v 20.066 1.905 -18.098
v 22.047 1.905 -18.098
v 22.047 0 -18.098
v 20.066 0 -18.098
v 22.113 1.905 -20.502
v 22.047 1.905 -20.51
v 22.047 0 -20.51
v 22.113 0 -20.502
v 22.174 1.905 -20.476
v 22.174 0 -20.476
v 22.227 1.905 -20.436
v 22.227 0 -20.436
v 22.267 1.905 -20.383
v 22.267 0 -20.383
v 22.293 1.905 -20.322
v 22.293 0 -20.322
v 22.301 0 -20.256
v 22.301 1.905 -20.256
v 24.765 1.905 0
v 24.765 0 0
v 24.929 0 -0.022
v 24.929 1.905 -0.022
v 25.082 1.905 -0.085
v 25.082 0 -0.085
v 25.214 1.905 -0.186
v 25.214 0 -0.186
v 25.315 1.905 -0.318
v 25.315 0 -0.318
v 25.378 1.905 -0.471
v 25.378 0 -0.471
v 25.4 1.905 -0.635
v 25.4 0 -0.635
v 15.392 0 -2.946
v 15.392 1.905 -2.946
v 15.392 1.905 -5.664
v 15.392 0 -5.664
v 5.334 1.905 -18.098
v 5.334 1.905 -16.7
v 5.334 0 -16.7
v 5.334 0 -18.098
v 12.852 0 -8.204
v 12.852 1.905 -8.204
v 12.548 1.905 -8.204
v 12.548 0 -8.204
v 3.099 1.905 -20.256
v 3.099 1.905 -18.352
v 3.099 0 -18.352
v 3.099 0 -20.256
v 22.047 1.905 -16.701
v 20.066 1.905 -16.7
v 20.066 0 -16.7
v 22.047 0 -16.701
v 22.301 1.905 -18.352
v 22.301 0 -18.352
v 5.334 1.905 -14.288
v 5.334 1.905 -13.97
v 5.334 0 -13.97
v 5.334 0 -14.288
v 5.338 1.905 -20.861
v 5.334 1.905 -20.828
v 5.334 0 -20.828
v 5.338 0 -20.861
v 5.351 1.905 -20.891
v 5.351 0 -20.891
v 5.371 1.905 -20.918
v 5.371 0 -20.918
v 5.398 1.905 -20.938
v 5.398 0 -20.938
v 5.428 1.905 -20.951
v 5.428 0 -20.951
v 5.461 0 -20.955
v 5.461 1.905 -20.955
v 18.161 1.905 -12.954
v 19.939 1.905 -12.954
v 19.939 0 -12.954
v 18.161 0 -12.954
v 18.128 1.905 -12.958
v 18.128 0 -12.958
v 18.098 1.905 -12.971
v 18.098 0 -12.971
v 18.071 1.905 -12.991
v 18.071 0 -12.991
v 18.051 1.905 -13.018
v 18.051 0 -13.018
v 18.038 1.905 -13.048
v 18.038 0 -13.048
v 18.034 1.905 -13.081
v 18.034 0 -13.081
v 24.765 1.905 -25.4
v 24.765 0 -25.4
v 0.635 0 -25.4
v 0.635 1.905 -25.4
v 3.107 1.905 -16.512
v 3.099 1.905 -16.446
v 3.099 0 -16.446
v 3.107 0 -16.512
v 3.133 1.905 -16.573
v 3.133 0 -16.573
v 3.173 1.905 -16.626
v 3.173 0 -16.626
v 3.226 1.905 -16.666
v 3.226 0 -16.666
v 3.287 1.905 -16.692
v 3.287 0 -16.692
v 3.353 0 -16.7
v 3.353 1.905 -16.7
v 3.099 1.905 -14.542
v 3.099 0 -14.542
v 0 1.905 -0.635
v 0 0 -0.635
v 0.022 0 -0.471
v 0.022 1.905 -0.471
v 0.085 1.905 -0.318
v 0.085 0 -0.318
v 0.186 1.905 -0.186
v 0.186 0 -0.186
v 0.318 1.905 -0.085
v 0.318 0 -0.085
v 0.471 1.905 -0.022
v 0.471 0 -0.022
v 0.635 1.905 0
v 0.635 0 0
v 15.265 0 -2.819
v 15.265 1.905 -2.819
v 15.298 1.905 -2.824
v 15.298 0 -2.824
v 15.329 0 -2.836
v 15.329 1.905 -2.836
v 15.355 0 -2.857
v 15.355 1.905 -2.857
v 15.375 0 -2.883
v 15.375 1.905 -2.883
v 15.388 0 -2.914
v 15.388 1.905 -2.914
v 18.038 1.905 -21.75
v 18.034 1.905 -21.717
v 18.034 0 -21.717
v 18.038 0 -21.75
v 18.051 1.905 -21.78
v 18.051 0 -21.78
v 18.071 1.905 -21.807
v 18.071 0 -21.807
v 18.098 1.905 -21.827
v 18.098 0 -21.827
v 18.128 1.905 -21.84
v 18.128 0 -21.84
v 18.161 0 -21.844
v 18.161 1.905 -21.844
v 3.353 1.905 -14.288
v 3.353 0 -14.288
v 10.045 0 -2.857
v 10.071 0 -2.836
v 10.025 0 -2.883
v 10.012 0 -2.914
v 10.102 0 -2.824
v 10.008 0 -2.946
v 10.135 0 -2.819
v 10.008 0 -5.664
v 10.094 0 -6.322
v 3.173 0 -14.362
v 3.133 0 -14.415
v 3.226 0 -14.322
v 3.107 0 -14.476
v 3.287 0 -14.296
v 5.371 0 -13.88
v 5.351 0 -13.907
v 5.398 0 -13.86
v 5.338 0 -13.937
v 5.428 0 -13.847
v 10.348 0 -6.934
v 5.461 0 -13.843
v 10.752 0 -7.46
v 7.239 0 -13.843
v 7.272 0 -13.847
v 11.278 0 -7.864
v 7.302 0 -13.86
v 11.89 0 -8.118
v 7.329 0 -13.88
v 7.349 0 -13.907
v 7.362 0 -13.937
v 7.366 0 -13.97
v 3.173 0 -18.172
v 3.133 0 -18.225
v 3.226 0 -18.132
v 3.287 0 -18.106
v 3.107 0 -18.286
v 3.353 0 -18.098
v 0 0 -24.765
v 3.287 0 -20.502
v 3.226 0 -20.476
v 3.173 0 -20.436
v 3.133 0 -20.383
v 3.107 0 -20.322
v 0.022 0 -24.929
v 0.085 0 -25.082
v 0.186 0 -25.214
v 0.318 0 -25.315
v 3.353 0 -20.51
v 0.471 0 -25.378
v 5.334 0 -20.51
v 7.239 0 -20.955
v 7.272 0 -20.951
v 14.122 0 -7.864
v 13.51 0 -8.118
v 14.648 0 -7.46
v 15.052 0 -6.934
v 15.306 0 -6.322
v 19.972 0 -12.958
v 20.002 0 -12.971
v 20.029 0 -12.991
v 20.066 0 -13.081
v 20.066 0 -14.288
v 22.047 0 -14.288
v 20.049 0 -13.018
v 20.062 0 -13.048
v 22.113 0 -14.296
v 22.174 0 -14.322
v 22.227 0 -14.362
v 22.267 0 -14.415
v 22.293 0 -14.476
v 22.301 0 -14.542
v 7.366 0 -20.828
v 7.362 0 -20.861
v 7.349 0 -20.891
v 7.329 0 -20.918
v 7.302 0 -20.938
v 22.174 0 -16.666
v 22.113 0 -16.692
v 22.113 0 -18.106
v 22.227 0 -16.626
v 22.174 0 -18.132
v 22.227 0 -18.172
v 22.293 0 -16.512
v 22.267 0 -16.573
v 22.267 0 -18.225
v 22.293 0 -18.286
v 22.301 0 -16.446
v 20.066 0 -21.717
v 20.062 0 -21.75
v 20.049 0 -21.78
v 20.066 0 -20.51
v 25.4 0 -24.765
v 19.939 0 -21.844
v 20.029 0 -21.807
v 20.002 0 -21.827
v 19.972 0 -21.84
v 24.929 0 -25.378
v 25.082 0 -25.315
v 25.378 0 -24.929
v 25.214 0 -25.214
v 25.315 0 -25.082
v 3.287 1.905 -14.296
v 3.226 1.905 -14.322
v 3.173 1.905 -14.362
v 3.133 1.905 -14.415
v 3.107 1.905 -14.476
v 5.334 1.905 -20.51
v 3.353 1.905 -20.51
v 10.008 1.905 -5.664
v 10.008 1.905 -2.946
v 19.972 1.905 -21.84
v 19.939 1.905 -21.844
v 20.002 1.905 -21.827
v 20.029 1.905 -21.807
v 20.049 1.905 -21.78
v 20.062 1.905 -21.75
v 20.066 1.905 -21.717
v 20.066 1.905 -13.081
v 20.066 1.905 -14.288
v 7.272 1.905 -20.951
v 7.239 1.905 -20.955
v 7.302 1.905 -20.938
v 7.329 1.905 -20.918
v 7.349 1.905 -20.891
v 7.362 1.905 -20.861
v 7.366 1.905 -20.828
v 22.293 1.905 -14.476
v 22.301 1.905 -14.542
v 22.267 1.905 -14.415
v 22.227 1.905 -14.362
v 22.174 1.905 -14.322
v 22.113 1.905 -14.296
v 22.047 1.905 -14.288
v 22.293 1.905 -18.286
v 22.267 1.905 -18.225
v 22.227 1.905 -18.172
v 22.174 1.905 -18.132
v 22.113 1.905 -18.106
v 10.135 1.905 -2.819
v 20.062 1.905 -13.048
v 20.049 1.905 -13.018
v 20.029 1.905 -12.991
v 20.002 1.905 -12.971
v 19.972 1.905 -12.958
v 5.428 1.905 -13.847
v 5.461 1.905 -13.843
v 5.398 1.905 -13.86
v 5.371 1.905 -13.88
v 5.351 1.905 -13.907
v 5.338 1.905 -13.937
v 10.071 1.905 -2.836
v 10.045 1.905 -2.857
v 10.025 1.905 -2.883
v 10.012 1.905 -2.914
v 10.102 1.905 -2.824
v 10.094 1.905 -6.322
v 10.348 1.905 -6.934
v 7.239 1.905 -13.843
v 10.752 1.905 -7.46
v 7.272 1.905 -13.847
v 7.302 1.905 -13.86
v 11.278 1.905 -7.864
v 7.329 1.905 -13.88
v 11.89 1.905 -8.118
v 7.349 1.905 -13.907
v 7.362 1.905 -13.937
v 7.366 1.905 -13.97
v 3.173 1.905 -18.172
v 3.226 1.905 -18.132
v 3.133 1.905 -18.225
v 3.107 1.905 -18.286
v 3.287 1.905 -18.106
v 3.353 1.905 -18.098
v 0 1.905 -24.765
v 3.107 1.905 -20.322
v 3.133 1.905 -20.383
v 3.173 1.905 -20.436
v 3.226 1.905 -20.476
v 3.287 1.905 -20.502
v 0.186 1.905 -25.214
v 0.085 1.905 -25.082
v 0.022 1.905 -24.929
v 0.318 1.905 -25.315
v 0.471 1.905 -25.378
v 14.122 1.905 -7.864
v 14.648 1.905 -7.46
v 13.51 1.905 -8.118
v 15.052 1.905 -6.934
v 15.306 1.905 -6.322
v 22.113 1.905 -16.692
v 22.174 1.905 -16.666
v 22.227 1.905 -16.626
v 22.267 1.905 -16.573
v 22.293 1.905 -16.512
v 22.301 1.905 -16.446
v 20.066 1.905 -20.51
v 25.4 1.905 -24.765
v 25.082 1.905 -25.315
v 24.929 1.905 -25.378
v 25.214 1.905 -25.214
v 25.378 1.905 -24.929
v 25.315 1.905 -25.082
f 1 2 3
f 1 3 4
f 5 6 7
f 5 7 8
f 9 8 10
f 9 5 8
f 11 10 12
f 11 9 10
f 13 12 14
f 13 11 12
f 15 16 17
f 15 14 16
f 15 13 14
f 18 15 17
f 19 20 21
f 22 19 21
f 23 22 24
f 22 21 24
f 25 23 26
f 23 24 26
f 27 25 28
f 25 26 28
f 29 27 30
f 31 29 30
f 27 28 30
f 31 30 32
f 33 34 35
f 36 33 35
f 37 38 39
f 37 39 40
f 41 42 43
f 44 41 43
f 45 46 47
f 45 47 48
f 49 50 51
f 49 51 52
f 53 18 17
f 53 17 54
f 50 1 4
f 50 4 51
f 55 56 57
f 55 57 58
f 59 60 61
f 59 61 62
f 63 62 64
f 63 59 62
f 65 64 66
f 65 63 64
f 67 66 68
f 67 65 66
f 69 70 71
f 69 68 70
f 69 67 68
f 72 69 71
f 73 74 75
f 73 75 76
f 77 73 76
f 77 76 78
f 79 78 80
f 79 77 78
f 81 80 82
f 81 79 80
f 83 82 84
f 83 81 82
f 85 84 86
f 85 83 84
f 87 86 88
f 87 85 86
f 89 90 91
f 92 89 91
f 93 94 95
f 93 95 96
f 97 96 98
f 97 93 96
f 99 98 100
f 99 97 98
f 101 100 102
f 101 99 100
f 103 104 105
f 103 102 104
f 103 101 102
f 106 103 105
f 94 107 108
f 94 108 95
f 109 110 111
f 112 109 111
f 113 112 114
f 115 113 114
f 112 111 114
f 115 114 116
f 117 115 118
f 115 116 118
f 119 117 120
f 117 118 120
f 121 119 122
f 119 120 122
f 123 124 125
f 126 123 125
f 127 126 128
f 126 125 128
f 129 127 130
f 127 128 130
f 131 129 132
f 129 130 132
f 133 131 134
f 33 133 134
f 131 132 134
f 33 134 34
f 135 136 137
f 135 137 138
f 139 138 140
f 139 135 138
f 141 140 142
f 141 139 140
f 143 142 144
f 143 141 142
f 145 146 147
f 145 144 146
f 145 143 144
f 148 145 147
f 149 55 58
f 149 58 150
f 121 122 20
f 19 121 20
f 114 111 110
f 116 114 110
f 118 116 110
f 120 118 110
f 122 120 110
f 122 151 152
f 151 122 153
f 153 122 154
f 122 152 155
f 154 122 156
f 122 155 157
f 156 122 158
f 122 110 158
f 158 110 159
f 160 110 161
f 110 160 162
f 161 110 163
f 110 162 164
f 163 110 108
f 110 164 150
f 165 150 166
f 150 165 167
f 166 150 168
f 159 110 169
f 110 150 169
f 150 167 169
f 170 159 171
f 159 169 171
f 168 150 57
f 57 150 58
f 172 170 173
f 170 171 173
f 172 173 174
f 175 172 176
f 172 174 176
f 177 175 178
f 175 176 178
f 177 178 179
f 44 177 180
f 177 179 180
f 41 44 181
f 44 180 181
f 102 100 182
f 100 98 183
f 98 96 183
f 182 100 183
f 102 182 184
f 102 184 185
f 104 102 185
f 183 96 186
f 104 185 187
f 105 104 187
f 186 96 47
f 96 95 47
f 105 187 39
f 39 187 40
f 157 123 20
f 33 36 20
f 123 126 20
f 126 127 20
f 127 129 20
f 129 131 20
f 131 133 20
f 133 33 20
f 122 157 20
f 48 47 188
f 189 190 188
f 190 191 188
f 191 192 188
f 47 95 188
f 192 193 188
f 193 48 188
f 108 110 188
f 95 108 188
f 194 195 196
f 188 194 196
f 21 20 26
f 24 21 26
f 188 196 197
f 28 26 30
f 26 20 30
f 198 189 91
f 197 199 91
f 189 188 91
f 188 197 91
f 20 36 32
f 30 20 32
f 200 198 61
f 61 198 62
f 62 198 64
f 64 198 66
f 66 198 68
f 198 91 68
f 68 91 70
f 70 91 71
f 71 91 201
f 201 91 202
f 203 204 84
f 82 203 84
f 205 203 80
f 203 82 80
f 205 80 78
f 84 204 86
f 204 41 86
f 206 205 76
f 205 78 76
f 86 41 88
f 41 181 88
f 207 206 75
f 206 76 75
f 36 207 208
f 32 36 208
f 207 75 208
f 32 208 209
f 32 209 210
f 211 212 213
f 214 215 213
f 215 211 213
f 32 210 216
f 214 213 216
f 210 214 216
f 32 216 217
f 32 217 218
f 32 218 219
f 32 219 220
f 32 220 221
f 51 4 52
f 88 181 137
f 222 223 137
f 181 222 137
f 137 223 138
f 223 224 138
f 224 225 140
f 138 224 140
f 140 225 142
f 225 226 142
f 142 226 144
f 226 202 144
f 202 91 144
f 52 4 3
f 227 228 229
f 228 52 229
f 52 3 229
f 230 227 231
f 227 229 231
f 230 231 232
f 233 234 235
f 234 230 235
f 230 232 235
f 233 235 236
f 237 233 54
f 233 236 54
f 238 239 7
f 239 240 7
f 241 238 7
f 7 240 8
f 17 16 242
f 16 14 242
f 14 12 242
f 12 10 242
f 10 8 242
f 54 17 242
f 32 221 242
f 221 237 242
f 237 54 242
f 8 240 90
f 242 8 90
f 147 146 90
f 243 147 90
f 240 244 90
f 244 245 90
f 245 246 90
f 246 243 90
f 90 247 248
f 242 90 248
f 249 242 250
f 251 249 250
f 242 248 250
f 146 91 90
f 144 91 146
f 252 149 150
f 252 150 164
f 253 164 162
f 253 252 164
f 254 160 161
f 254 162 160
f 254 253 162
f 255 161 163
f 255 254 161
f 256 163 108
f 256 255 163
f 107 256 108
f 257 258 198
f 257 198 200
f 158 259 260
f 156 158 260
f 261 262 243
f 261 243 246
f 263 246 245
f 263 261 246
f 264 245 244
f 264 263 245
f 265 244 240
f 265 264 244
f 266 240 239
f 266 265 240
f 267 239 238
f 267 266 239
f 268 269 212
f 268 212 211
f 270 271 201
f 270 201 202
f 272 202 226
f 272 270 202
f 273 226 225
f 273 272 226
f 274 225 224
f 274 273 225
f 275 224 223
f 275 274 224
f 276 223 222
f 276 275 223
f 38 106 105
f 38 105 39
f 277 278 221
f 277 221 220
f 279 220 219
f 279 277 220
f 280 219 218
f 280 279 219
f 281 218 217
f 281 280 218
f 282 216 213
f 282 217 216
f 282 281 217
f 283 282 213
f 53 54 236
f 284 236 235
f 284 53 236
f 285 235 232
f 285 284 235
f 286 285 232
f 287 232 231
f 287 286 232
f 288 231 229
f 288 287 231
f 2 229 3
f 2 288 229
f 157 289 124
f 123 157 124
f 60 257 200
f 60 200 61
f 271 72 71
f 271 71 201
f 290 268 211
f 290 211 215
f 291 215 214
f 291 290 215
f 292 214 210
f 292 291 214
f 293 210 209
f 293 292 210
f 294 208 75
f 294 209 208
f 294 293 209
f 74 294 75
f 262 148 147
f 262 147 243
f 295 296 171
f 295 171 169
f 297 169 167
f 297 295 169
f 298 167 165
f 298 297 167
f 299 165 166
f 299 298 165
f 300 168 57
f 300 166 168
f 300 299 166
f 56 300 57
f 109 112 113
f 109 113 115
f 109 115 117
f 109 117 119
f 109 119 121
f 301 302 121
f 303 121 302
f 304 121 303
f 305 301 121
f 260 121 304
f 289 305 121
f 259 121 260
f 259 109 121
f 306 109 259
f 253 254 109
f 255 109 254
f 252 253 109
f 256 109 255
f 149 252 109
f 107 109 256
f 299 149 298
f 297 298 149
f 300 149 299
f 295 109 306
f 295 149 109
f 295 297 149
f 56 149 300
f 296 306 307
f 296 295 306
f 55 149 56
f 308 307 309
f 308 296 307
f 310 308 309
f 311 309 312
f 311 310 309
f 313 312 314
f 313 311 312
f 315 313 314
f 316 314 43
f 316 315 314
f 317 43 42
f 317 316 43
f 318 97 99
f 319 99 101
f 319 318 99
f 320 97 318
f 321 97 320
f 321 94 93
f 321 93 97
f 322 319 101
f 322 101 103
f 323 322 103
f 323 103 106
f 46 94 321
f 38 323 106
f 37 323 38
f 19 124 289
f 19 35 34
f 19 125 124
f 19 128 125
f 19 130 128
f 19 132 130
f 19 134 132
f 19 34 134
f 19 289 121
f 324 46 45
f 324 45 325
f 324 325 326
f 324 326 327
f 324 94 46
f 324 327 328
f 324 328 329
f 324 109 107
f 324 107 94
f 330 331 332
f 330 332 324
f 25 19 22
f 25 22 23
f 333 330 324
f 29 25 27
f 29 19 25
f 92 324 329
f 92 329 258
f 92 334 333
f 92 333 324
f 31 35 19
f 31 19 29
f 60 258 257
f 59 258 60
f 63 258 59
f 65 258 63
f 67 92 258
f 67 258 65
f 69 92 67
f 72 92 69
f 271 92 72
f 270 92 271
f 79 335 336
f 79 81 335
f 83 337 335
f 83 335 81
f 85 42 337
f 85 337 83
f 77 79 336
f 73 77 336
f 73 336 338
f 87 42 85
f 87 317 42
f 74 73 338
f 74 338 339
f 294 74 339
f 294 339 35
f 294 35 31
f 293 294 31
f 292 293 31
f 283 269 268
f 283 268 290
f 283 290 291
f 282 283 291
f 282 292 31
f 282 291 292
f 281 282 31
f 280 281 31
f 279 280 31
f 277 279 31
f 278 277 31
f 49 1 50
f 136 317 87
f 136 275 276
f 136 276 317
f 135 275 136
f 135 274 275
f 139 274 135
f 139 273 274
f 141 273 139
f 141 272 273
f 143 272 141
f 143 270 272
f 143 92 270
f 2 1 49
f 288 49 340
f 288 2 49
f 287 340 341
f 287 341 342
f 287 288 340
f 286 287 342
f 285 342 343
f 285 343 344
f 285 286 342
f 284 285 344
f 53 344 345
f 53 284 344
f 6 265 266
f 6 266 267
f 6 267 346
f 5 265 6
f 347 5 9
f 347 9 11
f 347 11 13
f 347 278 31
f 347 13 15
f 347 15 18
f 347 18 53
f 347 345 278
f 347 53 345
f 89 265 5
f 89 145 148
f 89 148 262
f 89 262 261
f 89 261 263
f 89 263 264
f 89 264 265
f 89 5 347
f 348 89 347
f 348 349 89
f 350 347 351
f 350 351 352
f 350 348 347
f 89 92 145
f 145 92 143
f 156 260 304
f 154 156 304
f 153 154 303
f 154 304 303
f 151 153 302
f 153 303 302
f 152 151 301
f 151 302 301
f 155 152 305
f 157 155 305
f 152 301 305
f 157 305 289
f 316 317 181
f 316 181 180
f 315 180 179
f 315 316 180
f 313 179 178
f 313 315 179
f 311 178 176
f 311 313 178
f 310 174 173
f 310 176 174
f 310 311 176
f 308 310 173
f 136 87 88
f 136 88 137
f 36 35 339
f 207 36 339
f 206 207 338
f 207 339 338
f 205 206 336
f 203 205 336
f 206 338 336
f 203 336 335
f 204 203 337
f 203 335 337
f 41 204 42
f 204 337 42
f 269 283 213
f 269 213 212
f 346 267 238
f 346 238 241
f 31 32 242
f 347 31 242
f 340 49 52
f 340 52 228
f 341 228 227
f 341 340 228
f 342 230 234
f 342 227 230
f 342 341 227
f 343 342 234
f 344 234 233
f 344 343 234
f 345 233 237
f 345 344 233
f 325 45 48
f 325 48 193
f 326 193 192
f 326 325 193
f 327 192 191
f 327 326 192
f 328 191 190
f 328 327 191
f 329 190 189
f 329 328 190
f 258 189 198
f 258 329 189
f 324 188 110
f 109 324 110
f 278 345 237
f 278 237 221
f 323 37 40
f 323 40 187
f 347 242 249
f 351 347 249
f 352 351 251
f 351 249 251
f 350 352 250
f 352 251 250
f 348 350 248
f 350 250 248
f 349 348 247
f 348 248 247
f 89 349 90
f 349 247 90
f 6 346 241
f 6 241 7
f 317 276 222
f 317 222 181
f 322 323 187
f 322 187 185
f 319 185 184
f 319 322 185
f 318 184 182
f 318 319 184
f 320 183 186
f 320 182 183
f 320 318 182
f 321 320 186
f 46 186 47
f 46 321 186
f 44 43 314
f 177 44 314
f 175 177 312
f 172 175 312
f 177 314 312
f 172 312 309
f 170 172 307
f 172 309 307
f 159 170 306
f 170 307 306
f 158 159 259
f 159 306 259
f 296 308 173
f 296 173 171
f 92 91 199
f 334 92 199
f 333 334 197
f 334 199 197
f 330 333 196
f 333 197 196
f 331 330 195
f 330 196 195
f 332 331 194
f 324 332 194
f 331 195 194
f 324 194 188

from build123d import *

# Parameters (mm, degrees)
BOSS_EXTRUDE1_DEPTH = 1.905
CUT_EXTRUDE1_DEPTH  = 36.971502957


with BuildPart() as part:
    # Sketch1 → Boss-Extrude1 (new body)
    with BuildSketch(Plane(origin=(0, 0, 0), x_dir=(1, 0, 0), z_dir=(0, 1, 0))):
        with BuildLine():
            Line((0.635, 0), (24.765, 0))
            ThreePointArc((24.765, 0), (25.214012806, 0.185987194), (25.4, 0.635))
            Line((25.4, 0.635), (25.4, 24.765))
            ThreePointArc((25.4, 24.765), (25.214012806, 25.214012806), (24.765, 25.4))
            Line((24.765, 25.4), (0.635, 25.4))
            ThreePointArc((0.635, 25.4), (0.185987194, 25.214012806), (0, 24.765))
            Line((0, 24.765), (0, 0.635))
            ThreePointArc((0, 0.635), (0.185987194, 0.185987194), (0.635, 0))
        make_face()
    extrude(amount=BOSS_EXTRUDE1_DEPTH)

    # Sketch2 → Cut-Extrude1 (cut, through all)
    with BuildSketch(Plane(origin=(0, 1.905, 0), x_dir=(1, 0, 0), z_dir=(0, 1, 0))):
        with BuildLine():
            Line((10.1346, 2.8194), (15.2654, 2.8194))
            ThreePointArc((15.2654, 2.8194), (15.355202561, 2.856597439), (15.3924, 2.9464))
            Line((15.3924, 2.9464), (15.3924, 5.6642))
            ThreePointArc((15.3924, 5.6642), (14.648451224, 7.460251224), (12.8524, 8.2042))
            Line((12.8524, 8.2042), (12.5476, 8.2042))
            ThreePointArc((12.5476, 8.2042), (10.751548776, 7.460251224), (10.0076, 5.6642))
            Line((10.0076, 5.6642), (10.0076, 2.9464))
            ThreePointArc((10.0076, 2.9464), (10.044797439, 2.856597439), (10.1346, 2.8194))
        make_face()
        with BuildLine():
            Line((5.461, 20.955), (7.239, 20.955))
            ThreePointArc((7.239, 20.955), (7.328802561, 20.917802561), (7.366, 20.828))
            Line((7.366, 20.828), (7.366, 13.97))
            ThreePointArc((7.366, 13.97), (7.328802561, 13.880197439), (7.239, 13.843))
            Line((7.239, 13.843), (5.461, 13.843))
            ThreePointArc((5.461, 13.843), (5.371197439, 13.880197439), (5.334, 13.97))
            Line((5.334, 13.97), (5.334, 14.2875))
            Line((5.334, 14.2875), (3.3528, 14.2875))
            ThreePointArc((3.3528, 14.2875), (3.173194878, 14.361894878), (3.0988, 14.5415))
            Line((3.0988, 14.5415), (3.0988, 16.4465))
            ThreePointArc((3.0988, 16.4465), (3.173194878, 16.626105122), (3.3528, 16.7005))
            Line((3.3528, 16.7005), (5.334, 16.7005))
            Line((5.334, 16.7005), (5.334, 18.0975))
            Line((5.334, 18.0975), (3.3528, 18.0975))
            ThreePointArc((3.3528, 18.0975), (3.173194878, 18.171894878), (3.0988, 18.3515))
            Line((3.0988, 18.3515), (3.0988, 20.2565))
            ThreePointArc((3.0988, 20.2565), (3.173194878, 20.436105122), (3.3528, 20.5105))
            Line((3.3528, 20.5105), (5.334, 20.5105))
            Line((5.334, 20.5105), (5.334, 20.828))
            ThreePointArc((5.334, 20.828), (5.371197439, 20.917802561), (5.461, 20.955))
        make_face()
        with BuildLine():
            Line((18.161, 21.844), (19.939, 21.844))
            ThreePointArc((19.939, 21.844), (20.028802561, 21.806802561), (20.066, 21.717))
            Line((20.066, 21.717), (20.066, 20.5105))
            Line((20.066, 20.5105), (22.0472, 20.5105))
            ThreePointArc((22.0472, 20.5105), (22.226805122, 20.436105122), (22.3012, 20.2565))
            Line((22.3012, 20.2565), (22.3012, 18.3515))
            ThreePointArc((22.3012, 18.3515), (22.226805122, 18.171894878), (22.0472, 18.0975))
            Line((22.0472, 18.0975), (20.066, 18.0975))
            Line((20.066, 18.0975), (20.066, 16.7005))
            Line((20.066, 16.7005), (22.0472, 16.7005))
            ThreePointArc((22.0472, 16.7005), (22.226805122, 16.626105122), (22.3012, 16.4465))
            Line((22.3012, 16.4465), (22.3012, 14.5415))
            ThreePointArc((22.3012, 14.5415), (22.226805122, 14.361894878), (22.0472, 14.2875))
            Line((22.0472, 14.2875), (20.066, 14.2875))
            Line((20.066, 14.2875), (20.066, 13.081))
            ThreePointArc((20.066, 13.081), (20.028802561, 12.991197439), (19.939, 12.954))
            Line((19.939, 12.954), (18.161, 12.954))
            ThreePointArc((18.161, 12.954), (18.071197439, 12.991197439), (18.034, 13.081))
            Line((18.034, 13.081), (18.034, 21.717))
            ThreePointArc((18.034, 21.717), (18.071197439, 21.806802561), (18.161, 21.844))
        make_face()
    extrude(amount=-CUT_EXTRUDE1_DEPTH, mode=Mode.SUBTRACT)


solid = part.part
